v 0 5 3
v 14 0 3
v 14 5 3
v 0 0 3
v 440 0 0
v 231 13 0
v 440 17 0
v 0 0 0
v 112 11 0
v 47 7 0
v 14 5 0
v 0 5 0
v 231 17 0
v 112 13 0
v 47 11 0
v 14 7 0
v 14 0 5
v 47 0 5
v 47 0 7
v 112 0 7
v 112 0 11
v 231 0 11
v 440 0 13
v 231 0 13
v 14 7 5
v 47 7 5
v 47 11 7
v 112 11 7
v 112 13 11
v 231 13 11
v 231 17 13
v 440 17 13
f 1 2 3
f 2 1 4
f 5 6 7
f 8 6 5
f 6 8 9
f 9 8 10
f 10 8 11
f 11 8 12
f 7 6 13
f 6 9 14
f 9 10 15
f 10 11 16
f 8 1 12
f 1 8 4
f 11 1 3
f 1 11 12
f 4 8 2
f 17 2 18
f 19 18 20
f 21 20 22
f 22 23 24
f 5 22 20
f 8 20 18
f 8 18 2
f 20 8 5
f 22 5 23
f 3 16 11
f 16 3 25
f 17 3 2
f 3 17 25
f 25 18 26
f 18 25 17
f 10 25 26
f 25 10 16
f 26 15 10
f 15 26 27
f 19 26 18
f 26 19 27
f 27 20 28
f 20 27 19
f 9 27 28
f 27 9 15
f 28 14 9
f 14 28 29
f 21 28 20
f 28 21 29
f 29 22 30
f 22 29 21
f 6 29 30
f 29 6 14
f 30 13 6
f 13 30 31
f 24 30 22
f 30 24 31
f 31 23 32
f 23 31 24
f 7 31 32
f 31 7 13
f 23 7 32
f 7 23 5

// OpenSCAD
translate([1.0, 2.5, 1.5]) color([0.8756440829735669, 0.16255101499230828, 0.8680483691353614]) cube([2, 5, 3], center=true);
translate([3.0, 2.5, 1.5]) color([0.15305579700066485, 0.8462165202751376, 0.8200801239095041]) cube([2, 5, 3], center=true);
translate([5.0, 2.5, 1.5]) color([0.5849326984313064, 0.05125489506773162, 0.156166769208809]) cube([2, 5, 3], center=true);
translate([7.0, 2.5, 1.5]) color([0.34458118202681143, 0.291190613997825, 0.29342424365134856]) cube([2, 5, 3], center=true);
translate([9.0, 2.5, 1.5]) color([0.49485912757206985, 0.40365829021262367, 0.43100562682353716]) cube([2, 5, 3], center=true);
translate([11.0, 2.5, 1.5]) color([0.17003546655932655, 0.788340085303476, 0.5686027559906347]) cube([2, 5, 3], center=true);
translate([13.0, 2.5, 1.5]) color([0.44188886974638586, 0.3413461590512491, 0.009317740415098474]) cube([2, 5, 3], center=true);
translate([15.5, 3.5, 2.5]) color([0.72162474304745, 0.9099060293040379, 0.6642090292154819]) cube([3, 7, 5], center=true);
translate([18.5, 3.5, 2.5]) color([0.6628365798191557, 0.2575988974219705, 0.6122127561841502]) cube([3, 7, 5], center=true);
translate([21.5, 3.5, 2.5]) color([0.07024606726227145, 0.936077955543095, 0.27870721332570936]) cube([3, 7, 5], center=true);
translate([24.5, 3.5, 2.5]) color([0.8301443917589898, 0.5295296249528143, 0.06328696503387199]) cube([3, 7, 5], center=true);
translate([27.5, 3.5, 2.5]) color([0.639390097241117, 0.579686955437464, 0.9416538141960143]) cube([3, 7, 5], center=true);
translate([30.5, 3.5, 2.5]) color([0.6321291610349786, 0.5434228748459046, 0.38469874676133664]) cube([3, 7, 5], center=true);
translate([33.5, 3.5, 2.5]) color([0.434637548519362, 0.31139777068021024, 0.01363511702942577]) cube([3, 7, 5], center=true);
translate([36.5, 3.5, 2.5]) color([0.7785312160167684, 0.8197509625398982, 0.28044077713976767]) cube([3, 7, 5], center=true);
translate([39.5, 3.5, 2.5]) color([0.2581907625337724, 0.5272652548146236, 0.3179301097250754]) cube([3, 7, 5], center=true);
translate([42.5, 3.5, 2.5]) color([0.3422638341038545, 0.7055726929201963, 0.43169639849300545]) cube([3, 7, 5], center=true);
translate([45.5, 3.5, 2.5]) color([0.14170724037842175, 0.0059275683019511805, 0.5113413643489257]) cube([3, 7, 5], center=true);
translate([49.5, 5.5, 3.5]) color([0.7846494738841625, 0.7013909140505133, 0.7815279332048084]) cube([5, 11, 7], center=true);
translate([54.5, 5.5, 3.5]) color([0.38414456219182536, 0.4641305725985776, 0.036369164001931575]) cube([5, 11, 7], center=true);
translate([59.5, 5.5, 3.5]) color([0.9124290899309246, 0.6366653413633517, 0.798477007479407]) cube([5, 11, 7], center=true);
translate([64.5, 5.5, 3.5]) color([0.7602358551941967, 0.899814300356001, 0.3622224295816935]) cube([5, 11, 7], center=true);
translate([69.5, 5.5, 3.5]) color([0.9815510059994267, 0.15851660579635174, 0.19450942151924966]) cube([5, 11, 7], center=true);
translate([74.5, 5.5, 3.5]) color([0.35447317829590397, 0.700089123077614, 0.019141470871264166]) cube([5, 11, 7], center=true);
translate([79.5, 5.5, 3.5]) color([0.7352582011311831, 0.5715587801616956, 0.24207966979200135]) cube([5, 11, 7], center=true);
translate([84.5, 5.5, 3.5]) color([0.18514161515939986, 0.7580746928341441, 0.4199819570625165]) cube([5, 11, 7], center=true);
translate([89.5, 5.5, 3.5]) color([0.5731405723704375, 0.23673356878784502, 0.7138158488992904]) cube([5, 11, 7], center=true);
translate([94.5, 5.5, 3.5]) color([0.8637627475626694, 0.8949592620642776, 0.8103115760161889]) cube([5, 11, 7], center=true);
translate([99.5, 5.5, 3.5]) color([0.1004216369837837, 0.18827941391234093, 0.44049583318501173]) cube([5, 11, 7], center=true);
translate([104.5, 5.5, 3.5]) color([0.06522983258952386, 0.42674703623912436, 0.3947422574489625]) cube([5, 11, 7], center=true);
translate([109.5, 5.5, 3.5]) color([0.27185274848852736, 0.43721657158275895, 0.7577296702077931]) cube([5, 11, 7], center=true);
translate([115.5, 6.5, 5.5]) color([0.3561631337530091, 0.3277620307403001, 0.30701912216942273]) cube([7, 13, 11], center=true);
translate([122.5, 6.5, 5.5]) color([0.492518074892234, 0.7625268269371841, 0.2027877178963453]) cube([7, 13, 11], center=true);
translate([129.5, 6.5, 5.5]) color([0.39789846082497404, 0.4356119392473006, 0.6353731723550147]) cube([7, 13, 11], center=true);
translate([136.5, 6.5, 5.5]) color([0.673076446274384, 0.6970991483341651, 0.8225488218547198]) cube([7, 13, 11], center=true);
translate([143.5, 6.5, 5.5]) color([0.5826892216899469, 0.3545830833155835, 0.5687886411459258]) cube([7, 13, 11], center=true);
translate([150.5, 6.5, 5.5]) color([0.564415288794693, 0.2783497745403337, 0.8220051901362931]) cube([7, 13, 11], center=true);
translate([157.5, 6.5, 5.5]) color([0.39809270556066123, 0.9209203386432881, 0.13533998311747797]) cube([7, 13, 11], center=true);
translate([164.5, 6.5, 5.5]) color([0.08148203466772541, 0.8649487446802395, 0.36102136972914045]) cube([7, 13, 11], center=true);
translate([171.5, 6.5, 5.5]) color([0.06937329613248533, 0.7172877126247486, 0.671396341477498]) cube([7, 13, 11], center=true);
translate([178.5, 6.5, 5.5]) color([0.47110224547326685, 0.3145322421799046, 0.8413649413366762]) cube([7, 13, 11], center=true);
translate([185.5, 6.5, 5.5]) color([0.9545082818366412, 0.02538948740661906, 0.39264862168779513]) cube([7, 13, 11], center=true);
translate([192.5, 6.5, 5.5]) color([0.12527064222330164, 0.9928151500577586, 0.6355716010561779]) cube([7, 13, 11], center=true);
translate([199.5, 6.5, 5.5]) color([0.40641678624517696, 0.1421319514189895, 0.14748951348813844]) cube([7, 13, 11], center=true);
translate([206.5, 6.5, 5.5]) color([0.8666090764559645, 0.5114920143771782, 0.16291179601388028]) cube([7, 13, 11], center=true);
translate([213.5, 6.5, 5.5]) color([0.8928293074217152, 0.9106207302279238, 0.7053130391381187]) cube([7, 13, 11], center=true);
translate([220.5, 6.5, 5.5]) color([0.7162737307255599, 0.7235742512845528, 0.7298089625221481]) cube([7, 13, 11], center=true);
translate([227.5, 6.5, 5.5]) color([0.5196081403156461, 0.823493134639761, 0.6911885197769689]) cube([7, 13, 11], center=true);
translate([236.5, 8.5, 6.5]) color([0.6973164426626367, 0.38726457915960755, 0.18022138882203653]) cube([11, 17, 13], center=true);
translate([247.5, 8.5, 6.5]) color([0.8001465394041192, 0.8129994204848935, 0.08072942167368968]) cube([11, 17, 13], center=true);
translate([258.5, 8.5, 6.5]) color([0.17442535469903642, 0.26558344961408153, 0.8002006207478382]) cube([11, 17, 13], center=true);
translate([269.5, 8.5, 6.5]) color([0.3279381595582189, 0.7086727191051987, 0.7823295314553788]) cube([11, 17, 13], center=true);
translate([280.5, 8.5, 6.5]) color([0.5174360046946651, 0.45647885649310815, 0.9099967640280606]) cube([11, 17, 13], center=true);
translate([291.5, 8.5, 6.5]) color([0.7566722996545016, 0.44882496858184395, 0.15281911968142636]) cube([11, 17, 13], center=true);
translate([302.5, 8.5, 6.5]) color([0.6325441046469116, 0.1769660088535372, 0.5122224095001495]) cube([11, 17, 13], center=true);
translate([313.5, 8.5, 6.5]) color([0.8959696721858674, 0.31608020378500323, 0.9467436825606468]) cube([11, 17, 13], center=true);
translate([324.5, 8.5, 6.5]) color([0.1928870204716916, 0.7910187054913302, 0.6108926701450443]) cube([11, 17, 13], center=true);
translate([335.5, 8.5, 6.5]) color([0.8122678209742187, 0.5222627979471512, 0.7095307583634994]) cube([11, 17, 13], center=true);
translate([346.5, 8.5, 6.5]) color([0.9126687247694082, 0.13487625477079712, 0.7715208720856912]) cube([11, 17, 13], center=true);
translate([357.5, 8.5, 6.5]) color([0.05716454642595936, 0.08241654053773162, 0.5176706786705761]) cube([11, 17, 13], center=true);
translate([368.5, 8.5, 6.5]) color([0.0024604932439482585, 0.774865046739482, 0.10398133417765076]) cube([11, 17, 13], center=true);
translate([379.5, 8.5, 6.5]) color([0.6075408633971222, 0.5702741924791085, 0.335807396721168]) cube([11, 17, 13], center=true);
translate([390.5, 8.5, 6.5]) color([0.3780654483467295, 0.36205489178930694, 0.8413126085807436]) cube([11, 17, 13], center=true);
translate([401.5, 8.5, 6.5]) color([0.6365683683667089, 0.13610848275491239, 0.9255182446742467]) cube([11, 17, 13], center=true);
translate([412.5, 8.5, 6.5]) color([0.18259927432055334, 0.12509989752770068, 0.33788945440902196]) cube([11, 17, 13], center=true);
translate([423.5, 8.5, 6.5]) color([0.607477949510089, 0.04413950751599882, 0.6453929548117466]) cube([11, 17, 13], center=true);
translate([434.5, 8.5, 6.5]) color([0.6988419541065013, 0.7967664255910738, 0.9116718921976609]) cube([11, 17, 13], center=true);
